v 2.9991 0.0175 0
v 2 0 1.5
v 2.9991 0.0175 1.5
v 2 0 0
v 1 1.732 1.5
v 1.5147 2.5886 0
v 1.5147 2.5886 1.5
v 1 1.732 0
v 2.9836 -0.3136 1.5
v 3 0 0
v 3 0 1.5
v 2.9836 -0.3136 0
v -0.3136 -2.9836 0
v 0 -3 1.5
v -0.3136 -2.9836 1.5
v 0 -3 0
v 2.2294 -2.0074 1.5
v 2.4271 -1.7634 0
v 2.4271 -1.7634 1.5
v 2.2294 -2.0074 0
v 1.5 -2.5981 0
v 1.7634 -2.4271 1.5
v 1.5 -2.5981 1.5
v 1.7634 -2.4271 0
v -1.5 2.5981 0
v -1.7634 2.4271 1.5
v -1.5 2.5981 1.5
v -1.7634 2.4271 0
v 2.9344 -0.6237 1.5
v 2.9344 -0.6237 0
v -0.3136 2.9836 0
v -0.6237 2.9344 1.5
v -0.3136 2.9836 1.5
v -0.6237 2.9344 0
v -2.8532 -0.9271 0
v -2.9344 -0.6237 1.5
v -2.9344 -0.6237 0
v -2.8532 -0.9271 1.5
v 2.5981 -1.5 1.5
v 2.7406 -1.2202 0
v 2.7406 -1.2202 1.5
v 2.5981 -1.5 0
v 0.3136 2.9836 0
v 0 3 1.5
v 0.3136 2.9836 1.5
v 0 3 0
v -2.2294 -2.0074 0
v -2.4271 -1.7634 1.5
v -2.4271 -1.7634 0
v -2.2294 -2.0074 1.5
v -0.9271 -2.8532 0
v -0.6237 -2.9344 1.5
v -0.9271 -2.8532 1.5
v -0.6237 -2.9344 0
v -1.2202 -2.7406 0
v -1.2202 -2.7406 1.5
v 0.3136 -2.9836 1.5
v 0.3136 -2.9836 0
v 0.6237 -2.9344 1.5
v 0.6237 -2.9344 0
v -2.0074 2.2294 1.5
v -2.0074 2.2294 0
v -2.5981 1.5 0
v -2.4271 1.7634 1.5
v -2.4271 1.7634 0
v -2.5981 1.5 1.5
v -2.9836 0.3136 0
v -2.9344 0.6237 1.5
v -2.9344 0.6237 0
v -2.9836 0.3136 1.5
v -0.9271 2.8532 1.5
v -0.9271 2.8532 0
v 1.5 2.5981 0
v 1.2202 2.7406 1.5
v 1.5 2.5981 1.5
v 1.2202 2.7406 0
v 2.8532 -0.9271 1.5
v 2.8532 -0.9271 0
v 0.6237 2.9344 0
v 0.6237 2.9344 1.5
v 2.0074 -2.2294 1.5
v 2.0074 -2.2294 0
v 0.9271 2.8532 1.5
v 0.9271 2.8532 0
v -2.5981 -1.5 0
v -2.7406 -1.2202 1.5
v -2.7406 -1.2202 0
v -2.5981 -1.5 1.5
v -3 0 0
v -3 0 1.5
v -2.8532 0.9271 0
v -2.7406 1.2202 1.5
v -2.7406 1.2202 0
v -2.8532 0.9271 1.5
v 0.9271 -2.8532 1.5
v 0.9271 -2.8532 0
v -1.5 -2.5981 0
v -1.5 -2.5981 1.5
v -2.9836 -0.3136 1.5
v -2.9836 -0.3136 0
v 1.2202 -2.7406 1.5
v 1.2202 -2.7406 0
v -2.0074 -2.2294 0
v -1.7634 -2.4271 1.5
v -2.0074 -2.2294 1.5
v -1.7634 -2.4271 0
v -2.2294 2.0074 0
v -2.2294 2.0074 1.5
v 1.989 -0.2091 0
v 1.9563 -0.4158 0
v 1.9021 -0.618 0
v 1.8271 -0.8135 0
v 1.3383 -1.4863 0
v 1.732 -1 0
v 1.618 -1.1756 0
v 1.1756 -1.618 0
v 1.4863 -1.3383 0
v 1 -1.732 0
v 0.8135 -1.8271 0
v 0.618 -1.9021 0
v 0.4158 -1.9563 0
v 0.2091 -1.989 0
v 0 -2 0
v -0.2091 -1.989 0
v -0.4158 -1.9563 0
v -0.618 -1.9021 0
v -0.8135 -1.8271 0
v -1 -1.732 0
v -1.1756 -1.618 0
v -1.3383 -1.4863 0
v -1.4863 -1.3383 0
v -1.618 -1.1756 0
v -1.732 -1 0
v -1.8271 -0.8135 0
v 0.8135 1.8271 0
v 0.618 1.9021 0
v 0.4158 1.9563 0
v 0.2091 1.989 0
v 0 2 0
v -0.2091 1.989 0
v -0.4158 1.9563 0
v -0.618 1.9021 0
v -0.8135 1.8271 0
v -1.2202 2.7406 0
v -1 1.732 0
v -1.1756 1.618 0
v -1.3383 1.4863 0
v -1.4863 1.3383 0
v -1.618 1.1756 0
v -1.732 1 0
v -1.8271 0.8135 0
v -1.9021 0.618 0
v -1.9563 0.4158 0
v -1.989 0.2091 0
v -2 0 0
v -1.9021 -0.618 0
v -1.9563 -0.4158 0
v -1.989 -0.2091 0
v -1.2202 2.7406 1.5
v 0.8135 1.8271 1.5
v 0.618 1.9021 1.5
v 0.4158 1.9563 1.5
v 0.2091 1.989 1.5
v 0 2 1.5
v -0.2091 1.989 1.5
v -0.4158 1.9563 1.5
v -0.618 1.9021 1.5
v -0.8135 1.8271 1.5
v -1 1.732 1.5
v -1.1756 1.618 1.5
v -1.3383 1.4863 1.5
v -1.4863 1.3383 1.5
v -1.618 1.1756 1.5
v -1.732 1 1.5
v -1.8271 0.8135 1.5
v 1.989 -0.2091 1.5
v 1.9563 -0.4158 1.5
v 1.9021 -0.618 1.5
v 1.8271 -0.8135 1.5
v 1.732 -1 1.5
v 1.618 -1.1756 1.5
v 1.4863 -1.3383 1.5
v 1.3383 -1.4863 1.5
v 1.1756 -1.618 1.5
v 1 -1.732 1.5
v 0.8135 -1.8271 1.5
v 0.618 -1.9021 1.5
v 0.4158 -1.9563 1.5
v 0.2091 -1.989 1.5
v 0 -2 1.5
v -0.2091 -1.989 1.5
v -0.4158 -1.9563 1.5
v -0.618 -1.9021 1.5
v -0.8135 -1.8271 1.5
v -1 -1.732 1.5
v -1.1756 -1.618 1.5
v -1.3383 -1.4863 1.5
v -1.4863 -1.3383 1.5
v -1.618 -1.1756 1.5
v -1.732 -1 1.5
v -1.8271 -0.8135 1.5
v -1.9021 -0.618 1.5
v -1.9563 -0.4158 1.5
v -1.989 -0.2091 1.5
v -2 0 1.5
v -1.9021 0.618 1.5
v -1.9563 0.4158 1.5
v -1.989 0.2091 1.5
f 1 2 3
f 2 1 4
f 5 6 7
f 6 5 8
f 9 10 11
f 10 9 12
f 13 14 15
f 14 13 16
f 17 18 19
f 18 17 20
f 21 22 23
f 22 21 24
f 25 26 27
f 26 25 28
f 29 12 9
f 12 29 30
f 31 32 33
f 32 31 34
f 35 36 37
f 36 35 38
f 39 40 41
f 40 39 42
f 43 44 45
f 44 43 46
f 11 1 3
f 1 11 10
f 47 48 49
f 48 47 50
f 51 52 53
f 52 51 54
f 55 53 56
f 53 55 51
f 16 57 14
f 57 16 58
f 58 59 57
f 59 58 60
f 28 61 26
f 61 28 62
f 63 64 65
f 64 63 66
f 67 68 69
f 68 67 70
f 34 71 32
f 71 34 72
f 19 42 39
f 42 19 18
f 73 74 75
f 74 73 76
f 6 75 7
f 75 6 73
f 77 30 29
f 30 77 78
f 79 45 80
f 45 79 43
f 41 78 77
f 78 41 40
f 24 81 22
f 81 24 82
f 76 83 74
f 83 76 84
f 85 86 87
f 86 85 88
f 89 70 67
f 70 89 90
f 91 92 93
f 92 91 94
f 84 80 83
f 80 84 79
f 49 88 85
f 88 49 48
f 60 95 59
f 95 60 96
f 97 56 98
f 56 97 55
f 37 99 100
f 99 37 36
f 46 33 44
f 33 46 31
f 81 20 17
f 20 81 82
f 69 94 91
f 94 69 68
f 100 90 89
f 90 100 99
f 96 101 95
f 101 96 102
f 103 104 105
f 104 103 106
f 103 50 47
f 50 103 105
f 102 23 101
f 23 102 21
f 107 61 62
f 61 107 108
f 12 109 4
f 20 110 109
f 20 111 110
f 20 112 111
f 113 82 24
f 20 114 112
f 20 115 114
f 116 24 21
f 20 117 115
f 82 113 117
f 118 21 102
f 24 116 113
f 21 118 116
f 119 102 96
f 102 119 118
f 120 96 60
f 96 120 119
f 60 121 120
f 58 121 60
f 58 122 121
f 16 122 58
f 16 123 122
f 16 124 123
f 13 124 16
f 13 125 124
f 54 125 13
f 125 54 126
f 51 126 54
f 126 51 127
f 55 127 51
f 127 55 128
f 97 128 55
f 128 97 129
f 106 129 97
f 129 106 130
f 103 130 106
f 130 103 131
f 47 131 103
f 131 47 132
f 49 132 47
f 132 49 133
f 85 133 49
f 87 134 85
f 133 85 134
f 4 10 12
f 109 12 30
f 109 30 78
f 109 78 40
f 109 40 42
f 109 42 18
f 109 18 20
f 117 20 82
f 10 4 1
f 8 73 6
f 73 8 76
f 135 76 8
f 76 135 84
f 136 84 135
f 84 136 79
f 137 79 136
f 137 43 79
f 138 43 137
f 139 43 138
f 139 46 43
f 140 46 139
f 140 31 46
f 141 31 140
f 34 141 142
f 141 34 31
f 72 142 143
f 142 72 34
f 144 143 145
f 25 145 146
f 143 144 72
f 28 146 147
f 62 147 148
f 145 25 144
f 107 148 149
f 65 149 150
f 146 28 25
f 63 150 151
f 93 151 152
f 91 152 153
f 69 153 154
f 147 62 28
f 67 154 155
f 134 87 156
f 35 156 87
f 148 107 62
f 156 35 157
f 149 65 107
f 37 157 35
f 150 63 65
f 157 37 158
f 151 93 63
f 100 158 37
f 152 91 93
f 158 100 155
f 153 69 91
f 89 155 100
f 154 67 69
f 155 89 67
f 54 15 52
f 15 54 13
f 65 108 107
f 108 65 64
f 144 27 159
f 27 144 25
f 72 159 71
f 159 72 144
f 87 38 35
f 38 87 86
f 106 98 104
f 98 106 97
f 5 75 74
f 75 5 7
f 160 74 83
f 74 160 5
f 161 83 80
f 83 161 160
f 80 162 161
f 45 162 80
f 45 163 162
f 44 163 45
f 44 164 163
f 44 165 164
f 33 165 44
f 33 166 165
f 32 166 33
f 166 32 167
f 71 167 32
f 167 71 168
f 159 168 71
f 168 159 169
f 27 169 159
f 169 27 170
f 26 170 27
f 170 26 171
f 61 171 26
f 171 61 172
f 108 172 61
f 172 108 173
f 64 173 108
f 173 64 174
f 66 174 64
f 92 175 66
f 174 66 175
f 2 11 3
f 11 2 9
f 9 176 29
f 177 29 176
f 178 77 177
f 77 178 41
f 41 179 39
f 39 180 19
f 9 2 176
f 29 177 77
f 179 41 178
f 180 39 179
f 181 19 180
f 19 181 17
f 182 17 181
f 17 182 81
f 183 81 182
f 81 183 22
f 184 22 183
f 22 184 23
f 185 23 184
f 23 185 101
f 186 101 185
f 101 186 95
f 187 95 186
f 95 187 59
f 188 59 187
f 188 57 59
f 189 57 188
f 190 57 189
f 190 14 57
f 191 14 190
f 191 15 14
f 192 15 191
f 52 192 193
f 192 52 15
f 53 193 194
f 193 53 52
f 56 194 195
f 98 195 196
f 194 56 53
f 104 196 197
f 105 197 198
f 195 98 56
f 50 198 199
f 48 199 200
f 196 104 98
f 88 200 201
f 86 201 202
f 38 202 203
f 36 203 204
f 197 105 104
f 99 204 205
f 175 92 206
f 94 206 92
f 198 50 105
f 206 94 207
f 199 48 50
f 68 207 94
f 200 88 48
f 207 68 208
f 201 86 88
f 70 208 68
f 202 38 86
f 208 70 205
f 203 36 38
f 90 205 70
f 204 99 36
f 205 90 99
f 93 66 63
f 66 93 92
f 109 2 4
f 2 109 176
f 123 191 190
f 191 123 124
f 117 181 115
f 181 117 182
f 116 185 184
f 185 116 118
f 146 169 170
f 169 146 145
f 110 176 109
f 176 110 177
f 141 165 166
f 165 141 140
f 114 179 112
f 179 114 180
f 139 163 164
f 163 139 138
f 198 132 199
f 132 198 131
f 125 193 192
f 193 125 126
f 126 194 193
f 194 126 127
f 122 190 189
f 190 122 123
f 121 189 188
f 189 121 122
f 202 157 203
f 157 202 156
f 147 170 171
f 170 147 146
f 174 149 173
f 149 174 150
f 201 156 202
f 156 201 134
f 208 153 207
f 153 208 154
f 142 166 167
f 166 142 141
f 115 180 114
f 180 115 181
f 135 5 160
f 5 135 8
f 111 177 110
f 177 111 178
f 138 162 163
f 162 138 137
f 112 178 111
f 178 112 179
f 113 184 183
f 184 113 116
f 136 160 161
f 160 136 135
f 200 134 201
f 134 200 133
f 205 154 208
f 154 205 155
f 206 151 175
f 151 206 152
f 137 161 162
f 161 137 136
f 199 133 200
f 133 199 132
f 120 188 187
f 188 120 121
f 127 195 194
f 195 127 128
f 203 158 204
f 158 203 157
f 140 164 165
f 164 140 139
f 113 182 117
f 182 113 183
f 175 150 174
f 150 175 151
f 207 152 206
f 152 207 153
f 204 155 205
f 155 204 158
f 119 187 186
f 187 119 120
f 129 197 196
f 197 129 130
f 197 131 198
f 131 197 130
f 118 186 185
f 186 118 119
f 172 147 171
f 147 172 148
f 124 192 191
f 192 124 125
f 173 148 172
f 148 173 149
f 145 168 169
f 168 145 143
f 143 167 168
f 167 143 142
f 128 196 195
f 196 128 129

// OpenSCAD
//Square Rod or Tubing Bracket
//Designed by Bryscus: Bryce B.

//Marker Height
MH=1.5;

//Cable Radius
CD=4;

//Wall thickness
WT=1;

//Opening (in degrees)
OD=60; //[10:160]

SLICE_SIZE=3.14*(CD)*2/360;

difference(){
	translate([0,0,MH/2])
		cylinder(h=MH, r=CD/2+WT,$fn=60,center=true); // screw hole
	translate([0,0,MH/2])
		cylinder(h=MH+1, r=CD/2,$fn=60,center=true); // screw hole
	for ( i = [1 : OD-1] )
	{
   	rotate(i, [0, 0, 1])
   	translate([(CD+1)/2, 0, (MH)/2])
   	cube([CD+1,SLICE_SIZE,MH+1], center=true);
	}
}
